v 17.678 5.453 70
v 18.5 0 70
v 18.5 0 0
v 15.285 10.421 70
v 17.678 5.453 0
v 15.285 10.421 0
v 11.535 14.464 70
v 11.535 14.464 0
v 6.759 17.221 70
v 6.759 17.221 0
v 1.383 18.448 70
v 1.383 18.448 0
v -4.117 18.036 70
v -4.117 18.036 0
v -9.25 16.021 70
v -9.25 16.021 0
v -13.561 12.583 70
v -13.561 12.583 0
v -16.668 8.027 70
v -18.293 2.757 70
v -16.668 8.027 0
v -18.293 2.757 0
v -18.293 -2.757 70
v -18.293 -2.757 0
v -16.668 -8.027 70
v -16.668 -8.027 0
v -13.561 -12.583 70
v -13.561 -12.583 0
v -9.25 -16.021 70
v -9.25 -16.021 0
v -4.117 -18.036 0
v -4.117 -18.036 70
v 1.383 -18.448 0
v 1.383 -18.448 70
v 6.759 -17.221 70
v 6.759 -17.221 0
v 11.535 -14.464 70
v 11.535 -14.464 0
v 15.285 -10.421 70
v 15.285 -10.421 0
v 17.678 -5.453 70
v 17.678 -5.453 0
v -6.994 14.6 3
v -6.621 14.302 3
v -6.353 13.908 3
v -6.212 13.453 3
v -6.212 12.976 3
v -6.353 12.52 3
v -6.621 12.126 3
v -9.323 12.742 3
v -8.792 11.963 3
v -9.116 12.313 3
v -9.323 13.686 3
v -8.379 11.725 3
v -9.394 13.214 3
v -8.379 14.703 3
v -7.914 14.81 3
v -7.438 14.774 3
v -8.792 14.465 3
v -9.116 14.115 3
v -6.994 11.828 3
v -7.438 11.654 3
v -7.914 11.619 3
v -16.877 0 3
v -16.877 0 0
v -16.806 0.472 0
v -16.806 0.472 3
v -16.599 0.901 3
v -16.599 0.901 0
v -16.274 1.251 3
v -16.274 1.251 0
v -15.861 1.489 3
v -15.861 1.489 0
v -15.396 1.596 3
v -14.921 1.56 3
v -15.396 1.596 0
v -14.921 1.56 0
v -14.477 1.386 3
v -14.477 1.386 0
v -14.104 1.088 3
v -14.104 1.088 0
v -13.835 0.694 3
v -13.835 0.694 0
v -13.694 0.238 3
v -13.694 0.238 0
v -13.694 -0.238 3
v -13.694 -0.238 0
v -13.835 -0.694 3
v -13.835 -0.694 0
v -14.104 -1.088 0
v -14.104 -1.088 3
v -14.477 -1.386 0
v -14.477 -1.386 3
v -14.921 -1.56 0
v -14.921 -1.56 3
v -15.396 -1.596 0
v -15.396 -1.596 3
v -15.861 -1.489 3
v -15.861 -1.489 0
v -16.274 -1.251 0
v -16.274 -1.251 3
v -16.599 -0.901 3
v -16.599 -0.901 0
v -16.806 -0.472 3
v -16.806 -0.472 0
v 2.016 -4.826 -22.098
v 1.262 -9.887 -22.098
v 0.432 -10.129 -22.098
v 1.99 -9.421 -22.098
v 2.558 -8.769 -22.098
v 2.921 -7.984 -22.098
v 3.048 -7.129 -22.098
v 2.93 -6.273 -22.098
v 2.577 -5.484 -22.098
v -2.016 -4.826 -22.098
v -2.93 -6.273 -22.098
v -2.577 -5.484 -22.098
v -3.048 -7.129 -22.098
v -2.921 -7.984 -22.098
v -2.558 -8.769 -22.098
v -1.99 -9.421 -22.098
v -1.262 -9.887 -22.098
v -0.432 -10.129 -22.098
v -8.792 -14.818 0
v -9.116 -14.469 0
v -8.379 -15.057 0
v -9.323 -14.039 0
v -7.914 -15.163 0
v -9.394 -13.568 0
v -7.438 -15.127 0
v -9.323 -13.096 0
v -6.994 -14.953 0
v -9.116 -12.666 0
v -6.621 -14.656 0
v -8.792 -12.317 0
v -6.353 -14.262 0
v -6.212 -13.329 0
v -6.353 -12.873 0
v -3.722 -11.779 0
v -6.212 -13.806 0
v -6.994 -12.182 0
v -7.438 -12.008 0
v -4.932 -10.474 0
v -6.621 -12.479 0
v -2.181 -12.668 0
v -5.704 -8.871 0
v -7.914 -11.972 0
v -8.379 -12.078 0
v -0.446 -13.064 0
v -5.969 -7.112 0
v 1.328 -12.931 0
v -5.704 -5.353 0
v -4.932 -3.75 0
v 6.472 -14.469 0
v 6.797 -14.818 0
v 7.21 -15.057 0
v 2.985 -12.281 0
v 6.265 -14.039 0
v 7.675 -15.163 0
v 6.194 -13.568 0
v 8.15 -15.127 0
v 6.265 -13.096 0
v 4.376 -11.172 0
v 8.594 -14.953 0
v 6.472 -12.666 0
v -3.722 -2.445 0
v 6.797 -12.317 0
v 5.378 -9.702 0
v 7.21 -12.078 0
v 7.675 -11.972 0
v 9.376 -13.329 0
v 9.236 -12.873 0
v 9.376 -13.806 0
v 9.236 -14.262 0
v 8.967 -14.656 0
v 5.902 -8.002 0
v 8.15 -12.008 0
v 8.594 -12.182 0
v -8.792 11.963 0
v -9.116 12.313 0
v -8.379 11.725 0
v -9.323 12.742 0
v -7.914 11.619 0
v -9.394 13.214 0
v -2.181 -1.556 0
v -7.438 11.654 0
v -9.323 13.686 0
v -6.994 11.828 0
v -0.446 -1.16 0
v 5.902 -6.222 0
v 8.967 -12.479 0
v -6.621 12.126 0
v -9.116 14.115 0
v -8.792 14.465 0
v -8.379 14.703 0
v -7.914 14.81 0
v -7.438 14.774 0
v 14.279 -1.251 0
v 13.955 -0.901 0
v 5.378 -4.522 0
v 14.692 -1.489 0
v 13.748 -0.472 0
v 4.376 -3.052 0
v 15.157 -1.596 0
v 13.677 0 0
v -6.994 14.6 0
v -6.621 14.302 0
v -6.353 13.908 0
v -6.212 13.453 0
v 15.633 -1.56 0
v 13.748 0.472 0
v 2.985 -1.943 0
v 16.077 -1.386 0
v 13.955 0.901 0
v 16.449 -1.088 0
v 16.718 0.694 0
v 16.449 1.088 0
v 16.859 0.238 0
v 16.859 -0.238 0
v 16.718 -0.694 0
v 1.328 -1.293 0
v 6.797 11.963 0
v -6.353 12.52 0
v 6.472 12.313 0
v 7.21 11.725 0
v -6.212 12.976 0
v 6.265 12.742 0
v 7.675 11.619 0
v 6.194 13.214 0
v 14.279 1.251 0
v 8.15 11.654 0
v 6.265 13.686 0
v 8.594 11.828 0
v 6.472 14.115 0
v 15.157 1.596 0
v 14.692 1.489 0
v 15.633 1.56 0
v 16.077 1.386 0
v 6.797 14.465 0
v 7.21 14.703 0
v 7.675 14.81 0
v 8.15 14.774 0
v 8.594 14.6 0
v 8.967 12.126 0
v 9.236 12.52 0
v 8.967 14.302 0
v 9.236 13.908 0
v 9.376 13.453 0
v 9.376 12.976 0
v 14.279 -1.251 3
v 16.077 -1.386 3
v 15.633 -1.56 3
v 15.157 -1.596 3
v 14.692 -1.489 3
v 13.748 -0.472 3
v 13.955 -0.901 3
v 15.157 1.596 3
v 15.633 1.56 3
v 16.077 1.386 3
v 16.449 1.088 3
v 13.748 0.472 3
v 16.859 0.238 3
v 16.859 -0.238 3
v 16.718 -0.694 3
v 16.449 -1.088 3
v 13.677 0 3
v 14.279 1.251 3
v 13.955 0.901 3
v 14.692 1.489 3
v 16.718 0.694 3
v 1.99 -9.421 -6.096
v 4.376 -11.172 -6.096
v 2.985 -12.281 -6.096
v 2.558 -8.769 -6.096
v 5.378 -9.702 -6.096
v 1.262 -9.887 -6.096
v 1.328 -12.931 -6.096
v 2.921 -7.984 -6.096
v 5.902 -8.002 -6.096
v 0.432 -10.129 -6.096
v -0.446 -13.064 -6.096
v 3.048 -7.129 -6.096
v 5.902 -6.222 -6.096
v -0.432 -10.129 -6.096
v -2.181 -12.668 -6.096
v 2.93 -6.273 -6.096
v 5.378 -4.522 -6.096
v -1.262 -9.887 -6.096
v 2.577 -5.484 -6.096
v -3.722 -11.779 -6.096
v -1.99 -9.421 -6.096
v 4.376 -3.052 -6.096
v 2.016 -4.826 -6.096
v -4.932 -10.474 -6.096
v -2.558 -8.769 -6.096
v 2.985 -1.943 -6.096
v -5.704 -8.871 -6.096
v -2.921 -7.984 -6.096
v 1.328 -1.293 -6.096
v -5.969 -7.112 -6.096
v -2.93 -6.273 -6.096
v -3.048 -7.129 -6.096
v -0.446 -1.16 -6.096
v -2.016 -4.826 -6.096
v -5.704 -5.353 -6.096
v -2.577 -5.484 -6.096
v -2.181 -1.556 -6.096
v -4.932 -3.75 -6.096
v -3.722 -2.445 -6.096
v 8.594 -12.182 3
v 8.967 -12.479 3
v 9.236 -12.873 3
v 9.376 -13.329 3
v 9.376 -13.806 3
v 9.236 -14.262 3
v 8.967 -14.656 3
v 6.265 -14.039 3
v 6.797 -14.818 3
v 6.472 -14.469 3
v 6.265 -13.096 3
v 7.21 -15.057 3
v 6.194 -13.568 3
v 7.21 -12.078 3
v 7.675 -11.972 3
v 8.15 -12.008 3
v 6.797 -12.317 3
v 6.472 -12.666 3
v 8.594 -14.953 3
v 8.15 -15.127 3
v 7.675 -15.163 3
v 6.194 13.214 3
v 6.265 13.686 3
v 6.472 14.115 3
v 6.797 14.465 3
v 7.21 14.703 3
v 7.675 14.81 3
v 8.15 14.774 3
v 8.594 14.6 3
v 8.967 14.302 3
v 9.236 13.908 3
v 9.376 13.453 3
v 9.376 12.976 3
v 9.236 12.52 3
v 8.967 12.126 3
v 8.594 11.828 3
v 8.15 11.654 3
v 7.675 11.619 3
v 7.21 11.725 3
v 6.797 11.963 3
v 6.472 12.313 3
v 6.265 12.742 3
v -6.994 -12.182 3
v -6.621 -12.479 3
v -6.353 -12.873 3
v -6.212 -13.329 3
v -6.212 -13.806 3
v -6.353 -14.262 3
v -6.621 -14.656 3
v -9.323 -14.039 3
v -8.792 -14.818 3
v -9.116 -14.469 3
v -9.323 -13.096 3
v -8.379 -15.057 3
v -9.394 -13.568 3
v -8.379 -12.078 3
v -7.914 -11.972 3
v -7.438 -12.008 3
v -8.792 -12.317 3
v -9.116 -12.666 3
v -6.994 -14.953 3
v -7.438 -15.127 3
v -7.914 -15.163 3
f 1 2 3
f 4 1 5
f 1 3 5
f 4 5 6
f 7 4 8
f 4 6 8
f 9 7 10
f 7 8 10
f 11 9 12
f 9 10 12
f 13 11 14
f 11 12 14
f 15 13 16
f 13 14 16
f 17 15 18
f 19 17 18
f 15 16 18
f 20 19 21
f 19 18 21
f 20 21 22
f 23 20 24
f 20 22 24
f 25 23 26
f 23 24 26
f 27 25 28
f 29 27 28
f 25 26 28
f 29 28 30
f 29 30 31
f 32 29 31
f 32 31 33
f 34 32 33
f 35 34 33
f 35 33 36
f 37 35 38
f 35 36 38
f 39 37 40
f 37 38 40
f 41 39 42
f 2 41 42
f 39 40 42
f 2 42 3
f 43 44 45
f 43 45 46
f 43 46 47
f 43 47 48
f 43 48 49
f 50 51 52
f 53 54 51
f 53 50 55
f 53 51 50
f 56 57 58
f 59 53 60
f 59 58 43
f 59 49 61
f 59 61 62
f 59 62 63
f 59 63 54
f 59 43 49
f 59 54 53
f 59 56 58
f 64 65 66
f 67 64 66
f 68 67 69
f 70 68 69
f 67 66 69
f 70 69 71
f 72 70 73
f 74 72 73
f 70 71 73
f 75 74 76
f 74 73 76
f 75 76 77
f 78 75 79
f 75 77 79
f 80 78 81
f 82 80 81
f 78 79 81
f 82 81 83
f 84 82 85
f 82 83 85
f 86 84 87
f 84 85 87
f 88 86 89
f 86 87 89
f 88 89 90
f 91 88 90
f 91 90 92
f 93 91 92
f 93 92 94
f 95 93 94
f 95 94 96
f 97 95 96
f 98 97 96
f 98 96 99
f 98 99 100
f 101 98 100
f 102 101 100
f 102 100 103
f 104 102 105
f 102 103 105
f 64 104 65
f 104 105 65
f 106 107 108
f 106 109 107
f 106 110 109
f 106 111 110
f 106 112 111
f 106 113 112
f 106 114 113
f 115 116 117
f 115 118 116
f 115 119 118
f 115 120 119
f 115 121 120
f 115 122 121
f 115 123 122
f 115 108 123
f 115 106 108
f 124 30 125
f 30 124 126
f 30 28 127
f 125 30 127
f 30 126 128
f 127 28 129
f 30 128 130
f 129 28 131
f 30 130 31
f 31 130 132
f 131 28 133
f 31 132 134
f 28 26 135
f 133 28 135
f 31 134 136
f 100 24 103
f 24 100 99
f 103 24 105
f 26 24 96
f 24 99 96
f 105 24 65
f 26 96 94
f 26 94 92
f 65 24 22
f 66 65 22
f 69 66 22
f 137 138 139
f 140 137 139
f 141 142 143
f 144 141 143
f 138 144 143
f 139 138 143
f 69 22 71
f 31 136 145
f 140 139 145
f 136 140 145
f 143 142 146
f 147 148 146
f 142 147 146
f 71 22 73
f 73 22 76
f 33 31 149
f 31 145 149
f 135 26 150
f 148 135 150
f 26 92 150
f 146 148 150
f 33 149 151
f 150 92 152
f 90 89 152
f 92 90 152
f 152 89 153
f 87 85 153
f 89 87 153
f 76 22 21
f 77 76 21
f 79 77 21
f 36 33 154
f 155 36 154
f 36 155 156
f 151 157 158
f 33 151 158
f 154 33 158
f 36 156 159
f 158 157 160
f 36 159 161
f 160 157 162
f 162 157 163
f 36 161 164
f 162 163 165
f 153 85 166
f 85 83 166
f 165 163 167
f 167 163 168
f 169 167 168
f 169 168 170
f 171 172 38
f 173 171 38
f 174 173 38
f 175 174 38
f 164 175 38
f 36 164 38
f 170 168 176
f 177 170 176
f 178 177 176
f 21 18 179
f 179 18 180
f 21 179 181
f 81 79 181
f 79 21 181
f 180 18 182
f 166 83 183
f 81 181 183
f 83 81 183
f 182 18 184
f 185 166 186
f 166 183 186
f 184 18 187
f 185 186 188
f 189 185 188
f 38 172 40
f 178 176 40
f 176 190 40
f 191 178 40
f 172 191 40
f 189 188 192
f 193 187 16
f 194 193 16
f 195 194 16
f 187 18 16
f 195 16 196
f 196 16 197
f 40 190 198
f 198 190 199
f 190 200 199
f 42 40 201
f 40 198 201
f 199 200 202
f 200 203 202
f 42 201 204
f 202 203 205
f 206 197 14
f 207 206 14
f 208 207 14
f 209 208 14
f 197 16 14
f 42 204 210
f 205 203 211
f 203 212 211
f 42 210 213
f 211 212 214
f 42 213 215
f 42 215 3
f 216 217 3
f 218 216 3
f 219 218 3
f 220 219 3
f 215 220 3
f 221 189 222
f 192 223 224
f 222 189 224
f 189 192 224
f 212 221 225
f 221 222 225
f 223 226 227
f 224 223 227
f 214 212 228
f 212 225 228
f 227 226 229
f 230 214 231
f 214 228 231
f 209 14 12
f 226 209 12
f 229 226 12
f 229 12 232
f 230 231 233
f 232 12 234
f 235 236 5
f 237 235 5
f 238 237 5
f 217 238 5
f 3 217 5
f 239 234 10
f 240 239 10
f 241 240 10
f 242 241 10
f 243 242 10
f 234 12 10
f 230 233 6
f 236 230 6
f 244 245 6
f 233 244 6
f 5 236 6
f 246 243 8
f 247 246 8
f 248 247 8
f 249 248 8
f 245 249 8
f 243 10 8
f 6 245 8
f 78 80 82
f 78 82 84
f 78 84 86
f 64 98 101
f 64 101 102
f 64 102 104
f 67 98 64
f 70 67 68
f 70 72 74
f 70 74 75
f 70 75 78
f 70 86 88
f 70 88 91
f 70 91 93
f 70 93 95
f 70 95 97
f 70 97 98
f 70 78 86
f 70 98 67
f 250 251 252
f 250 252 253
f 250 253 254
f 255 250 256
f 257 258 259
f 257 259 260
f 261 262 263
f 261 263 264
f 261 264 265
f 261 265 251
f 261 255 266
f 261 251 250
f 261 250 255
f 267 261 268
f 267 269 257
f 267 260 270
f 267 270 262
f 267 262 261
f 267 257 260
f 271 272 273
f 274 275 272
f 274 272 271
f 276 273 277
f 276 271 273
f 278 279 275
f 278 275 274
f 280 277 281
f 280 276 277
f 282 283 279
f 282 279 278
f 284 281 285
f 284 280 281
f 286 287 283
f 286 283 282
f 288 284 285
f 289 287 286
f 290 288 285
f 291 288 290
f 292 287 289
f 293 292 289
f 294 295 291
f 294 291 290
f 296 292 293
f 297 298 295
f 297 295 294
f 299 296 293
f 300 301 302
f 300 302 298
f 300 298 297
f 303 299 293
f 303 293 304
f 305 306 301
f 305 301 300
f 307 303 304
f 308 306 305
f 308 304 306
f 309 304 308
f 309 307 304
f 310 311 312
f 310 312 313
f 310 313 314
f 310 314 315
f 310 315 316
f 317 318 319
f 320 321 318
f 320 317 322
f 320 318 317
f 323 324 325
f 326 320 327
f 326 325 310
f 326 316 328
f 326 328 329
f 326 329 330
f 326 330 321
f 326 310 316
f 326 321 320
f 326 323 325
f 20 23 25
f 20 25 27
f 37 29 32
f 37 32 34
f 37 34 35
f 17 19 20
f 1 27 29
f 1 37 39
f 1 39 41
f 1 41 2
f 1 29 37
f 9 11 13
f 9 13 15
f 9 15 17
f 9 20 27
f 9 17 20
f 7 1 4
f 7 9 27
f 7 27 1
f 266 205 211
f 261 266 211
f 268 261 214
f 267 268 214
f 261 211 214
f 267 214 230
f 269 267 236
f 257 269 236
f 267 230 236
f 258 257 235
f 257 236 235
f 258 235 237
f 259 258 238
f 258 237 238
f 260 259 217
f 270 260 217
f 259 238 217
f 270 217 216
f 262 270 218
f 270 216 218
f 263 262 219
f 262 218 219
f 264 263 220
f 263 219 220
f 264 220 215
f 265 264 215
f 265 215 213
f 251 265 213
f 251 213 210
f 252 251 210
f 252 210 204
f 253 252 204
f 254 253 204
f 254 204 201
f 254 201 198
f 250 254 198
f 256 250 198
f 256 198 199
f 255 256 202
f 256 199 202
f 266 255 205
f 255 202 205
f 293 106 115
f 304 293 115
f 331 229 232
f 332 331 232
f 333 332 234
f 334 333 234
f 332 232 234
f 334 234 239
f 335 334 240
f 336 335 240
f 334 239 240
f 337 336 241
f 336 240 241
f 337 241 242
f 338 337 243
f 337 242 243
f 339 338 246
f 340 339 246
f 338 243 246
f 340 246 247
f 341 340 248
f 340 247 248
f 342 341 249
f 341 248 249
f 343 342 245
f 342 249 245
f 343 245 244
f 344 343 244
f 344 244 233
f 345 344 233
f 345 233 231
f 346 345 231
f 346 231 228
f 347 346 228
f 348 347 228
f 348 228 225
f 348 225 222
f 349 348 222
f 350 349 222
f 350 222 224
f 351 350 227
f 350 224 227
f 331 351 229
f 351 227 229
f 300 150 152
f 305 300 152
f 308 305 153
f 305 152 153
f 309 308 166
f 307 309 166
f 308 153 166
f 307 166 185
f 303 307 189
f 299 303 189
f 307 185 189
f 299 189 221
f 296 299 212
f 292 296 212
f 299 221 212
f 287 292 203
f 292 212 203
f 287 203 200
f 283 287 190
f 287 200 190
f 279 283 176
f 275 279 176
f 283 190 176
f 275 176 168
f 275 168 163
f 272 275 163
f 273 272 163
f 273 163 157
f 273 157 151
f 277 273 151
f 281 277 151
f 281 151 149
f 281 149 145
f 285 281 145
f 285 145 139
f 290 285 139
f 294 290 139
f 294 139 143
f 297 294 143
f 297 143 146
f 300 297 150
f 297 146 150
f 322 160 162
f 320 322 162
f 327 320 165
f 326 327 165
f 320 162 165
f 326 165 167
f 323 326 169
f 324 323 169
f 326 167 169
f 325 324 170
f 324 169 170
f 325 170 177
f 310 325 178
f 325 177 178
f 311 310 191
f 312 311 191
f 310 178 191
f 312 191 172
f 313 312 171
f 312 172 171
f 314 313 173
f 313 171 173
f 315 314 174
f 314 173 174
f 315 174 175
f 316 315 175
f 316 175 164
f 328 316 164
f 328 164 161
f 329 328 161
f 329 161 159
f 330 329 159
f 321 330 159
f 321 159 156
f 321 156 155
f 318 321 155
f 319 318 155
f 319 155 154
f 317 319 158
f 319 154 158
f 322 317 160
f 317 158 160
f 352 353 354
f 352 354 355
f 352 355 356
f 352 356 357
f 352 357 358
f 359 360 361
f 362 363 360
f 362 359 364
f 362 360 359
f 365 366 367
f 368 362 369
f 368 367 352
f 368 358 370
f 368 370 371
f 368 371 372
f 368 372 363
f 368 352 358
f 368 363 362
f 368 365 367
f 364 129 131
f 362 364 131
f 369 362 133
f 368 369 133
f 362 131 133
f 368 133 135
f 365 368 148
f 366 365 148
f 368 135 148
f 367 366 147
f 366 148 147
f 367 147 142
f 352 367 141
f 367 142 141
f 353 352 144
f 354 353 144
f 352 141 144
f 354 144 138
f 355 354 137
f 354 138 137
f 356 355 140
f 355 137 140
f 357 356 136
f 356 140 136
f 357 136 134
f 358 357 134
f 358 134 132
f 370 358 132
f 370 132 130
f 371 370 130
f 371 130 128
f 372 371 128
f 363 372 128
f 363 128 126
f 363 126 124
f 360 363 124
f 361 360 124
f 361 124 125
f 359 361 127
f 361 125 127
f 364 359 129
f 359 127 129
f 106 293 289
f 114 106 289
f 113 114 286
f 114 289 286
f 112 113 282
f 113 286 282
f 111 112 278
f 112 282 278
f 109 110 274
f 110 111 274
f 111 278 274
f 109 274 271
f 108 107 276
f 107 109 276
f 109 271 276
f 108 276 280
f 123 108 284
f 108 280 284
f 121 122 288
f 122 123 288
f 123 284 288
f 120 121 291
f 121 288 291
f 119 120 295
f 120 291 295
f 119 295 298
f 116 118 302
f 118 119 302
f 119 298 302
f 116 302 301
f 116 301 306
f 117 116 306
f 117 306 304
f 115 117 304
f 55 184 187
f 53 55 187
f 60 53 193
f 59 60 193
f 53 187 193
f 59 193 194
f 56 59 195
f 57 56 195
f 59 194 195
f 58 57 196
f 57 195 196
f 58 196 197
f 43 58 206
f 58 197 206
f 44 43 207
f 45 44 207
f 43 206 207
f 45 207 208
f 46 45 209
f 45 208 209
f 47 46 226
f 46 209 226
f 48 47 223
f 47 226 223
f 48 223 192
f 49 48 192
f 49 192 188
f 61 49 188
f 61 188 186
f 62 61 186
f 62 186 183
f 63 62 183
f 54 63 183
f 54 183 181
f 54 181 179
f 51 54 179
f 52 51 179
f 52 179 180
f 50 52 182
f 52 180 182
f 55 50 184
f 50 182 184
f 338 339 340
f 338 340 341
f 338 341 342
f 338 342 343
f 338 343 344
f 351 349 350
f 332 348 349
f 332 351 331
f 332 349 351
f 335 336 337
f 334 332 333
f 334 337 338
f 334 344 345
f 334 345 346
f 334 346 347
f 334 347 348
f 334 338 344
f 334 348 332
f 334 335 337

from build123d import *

# Parameters (mm, degrees)
SKETCH1_R           = 18.5
BOSS_EXTRUDE1_DEPTH = 70
SKETCH2_R           = 5.969
BOSS_EXTRUDE2_DEPTH = 6.096
SKETCH3_R           = 3.048
BOSS_EXTRUDE3_DEPTH = 16.002
SKETCH4_R           = 1.6
CUT_EXTRUDE1_DEPTH  = 3
SKETCH5_W           = 4.032124998
SKETCH5_H           = 0.762
CUT_EXTRUDE2_DEPTH  = 16.002


with BuildPart() as part:
    # Sketch1 → Boss-Extrude1 (new body)
    with BuildSketch(Plane.XY):
        Circle(SKETCH1_R)
    extrude(amount=BOSS_EXTRUDE1_DEPTH)

    # Sketch2 → Boss-Extrude2 (add)
    with BuildSketch(Plane(origin=(0, 0, 0), x_dir=(-1, 0, 0), z_dir=(0, 0, -1))):
        with Locations((0, -7.112)):
            Circle(SKETCH2_R)
    extrude(amount=BOSS_EXTRUDE2_DEPTH)

    # Sketch3 → Boss-Extrude3 (add)
    with BuildSketch(Plane(origin=(0, 0, -6.096), x_dir=(-1, 0, 0), z_dir=(0, 0, -1))):
        with Locations((0, -7.112)):
            Circle(SKETCH3_R)
    extrude(amount=BOSS_EXTRUDE3_DEPTH)

    # Sketch4 → Cut-Extrude1 (cut)
    with BuildSketch(Plane(origin=(0, 0, 0), x_dir=(-1, 0, 0), z_dir=(0, 0, -1))):
        with Locations((-15.2766, 0)):
            Circle(SKETCH4_R)
        with Locations((15.2766, 0)):
            Circle(SKETCH4_R)
        with Locations((7.794229315, -13.567540858)):
            Circle(SKETCH4_R)
        with Locations((-7.794229315, -13.567540858)):
            Circle(SKETCH4_R)
        with Locations((-7.794229315, 13.214096537)):
            Circle(SKETCH4_R)
        with Locations((7.794229315, 13.214096537)):
            Circle(SKETCH4_R)
    extrude(amount=-CUT_EXTRUDE1_DEPTH, mode=Mode.SUBTRACT)

    # Sketch5 → Cut-Extrude2 (cut)
    with BuildSketch(Plane(origin=(0, 0, -22.098), x_dir=(-1, 0, 0), z_dir=(0, 0, -1))):
        with Locations((0, -4.445)):
            Rectangle(SKETCH5_W, SKETCH5_H)
    extrude(amount=-CUT_EXTRUDE2_DEPTH, mode=Mode.SUBTRACT)


solid = part.part
